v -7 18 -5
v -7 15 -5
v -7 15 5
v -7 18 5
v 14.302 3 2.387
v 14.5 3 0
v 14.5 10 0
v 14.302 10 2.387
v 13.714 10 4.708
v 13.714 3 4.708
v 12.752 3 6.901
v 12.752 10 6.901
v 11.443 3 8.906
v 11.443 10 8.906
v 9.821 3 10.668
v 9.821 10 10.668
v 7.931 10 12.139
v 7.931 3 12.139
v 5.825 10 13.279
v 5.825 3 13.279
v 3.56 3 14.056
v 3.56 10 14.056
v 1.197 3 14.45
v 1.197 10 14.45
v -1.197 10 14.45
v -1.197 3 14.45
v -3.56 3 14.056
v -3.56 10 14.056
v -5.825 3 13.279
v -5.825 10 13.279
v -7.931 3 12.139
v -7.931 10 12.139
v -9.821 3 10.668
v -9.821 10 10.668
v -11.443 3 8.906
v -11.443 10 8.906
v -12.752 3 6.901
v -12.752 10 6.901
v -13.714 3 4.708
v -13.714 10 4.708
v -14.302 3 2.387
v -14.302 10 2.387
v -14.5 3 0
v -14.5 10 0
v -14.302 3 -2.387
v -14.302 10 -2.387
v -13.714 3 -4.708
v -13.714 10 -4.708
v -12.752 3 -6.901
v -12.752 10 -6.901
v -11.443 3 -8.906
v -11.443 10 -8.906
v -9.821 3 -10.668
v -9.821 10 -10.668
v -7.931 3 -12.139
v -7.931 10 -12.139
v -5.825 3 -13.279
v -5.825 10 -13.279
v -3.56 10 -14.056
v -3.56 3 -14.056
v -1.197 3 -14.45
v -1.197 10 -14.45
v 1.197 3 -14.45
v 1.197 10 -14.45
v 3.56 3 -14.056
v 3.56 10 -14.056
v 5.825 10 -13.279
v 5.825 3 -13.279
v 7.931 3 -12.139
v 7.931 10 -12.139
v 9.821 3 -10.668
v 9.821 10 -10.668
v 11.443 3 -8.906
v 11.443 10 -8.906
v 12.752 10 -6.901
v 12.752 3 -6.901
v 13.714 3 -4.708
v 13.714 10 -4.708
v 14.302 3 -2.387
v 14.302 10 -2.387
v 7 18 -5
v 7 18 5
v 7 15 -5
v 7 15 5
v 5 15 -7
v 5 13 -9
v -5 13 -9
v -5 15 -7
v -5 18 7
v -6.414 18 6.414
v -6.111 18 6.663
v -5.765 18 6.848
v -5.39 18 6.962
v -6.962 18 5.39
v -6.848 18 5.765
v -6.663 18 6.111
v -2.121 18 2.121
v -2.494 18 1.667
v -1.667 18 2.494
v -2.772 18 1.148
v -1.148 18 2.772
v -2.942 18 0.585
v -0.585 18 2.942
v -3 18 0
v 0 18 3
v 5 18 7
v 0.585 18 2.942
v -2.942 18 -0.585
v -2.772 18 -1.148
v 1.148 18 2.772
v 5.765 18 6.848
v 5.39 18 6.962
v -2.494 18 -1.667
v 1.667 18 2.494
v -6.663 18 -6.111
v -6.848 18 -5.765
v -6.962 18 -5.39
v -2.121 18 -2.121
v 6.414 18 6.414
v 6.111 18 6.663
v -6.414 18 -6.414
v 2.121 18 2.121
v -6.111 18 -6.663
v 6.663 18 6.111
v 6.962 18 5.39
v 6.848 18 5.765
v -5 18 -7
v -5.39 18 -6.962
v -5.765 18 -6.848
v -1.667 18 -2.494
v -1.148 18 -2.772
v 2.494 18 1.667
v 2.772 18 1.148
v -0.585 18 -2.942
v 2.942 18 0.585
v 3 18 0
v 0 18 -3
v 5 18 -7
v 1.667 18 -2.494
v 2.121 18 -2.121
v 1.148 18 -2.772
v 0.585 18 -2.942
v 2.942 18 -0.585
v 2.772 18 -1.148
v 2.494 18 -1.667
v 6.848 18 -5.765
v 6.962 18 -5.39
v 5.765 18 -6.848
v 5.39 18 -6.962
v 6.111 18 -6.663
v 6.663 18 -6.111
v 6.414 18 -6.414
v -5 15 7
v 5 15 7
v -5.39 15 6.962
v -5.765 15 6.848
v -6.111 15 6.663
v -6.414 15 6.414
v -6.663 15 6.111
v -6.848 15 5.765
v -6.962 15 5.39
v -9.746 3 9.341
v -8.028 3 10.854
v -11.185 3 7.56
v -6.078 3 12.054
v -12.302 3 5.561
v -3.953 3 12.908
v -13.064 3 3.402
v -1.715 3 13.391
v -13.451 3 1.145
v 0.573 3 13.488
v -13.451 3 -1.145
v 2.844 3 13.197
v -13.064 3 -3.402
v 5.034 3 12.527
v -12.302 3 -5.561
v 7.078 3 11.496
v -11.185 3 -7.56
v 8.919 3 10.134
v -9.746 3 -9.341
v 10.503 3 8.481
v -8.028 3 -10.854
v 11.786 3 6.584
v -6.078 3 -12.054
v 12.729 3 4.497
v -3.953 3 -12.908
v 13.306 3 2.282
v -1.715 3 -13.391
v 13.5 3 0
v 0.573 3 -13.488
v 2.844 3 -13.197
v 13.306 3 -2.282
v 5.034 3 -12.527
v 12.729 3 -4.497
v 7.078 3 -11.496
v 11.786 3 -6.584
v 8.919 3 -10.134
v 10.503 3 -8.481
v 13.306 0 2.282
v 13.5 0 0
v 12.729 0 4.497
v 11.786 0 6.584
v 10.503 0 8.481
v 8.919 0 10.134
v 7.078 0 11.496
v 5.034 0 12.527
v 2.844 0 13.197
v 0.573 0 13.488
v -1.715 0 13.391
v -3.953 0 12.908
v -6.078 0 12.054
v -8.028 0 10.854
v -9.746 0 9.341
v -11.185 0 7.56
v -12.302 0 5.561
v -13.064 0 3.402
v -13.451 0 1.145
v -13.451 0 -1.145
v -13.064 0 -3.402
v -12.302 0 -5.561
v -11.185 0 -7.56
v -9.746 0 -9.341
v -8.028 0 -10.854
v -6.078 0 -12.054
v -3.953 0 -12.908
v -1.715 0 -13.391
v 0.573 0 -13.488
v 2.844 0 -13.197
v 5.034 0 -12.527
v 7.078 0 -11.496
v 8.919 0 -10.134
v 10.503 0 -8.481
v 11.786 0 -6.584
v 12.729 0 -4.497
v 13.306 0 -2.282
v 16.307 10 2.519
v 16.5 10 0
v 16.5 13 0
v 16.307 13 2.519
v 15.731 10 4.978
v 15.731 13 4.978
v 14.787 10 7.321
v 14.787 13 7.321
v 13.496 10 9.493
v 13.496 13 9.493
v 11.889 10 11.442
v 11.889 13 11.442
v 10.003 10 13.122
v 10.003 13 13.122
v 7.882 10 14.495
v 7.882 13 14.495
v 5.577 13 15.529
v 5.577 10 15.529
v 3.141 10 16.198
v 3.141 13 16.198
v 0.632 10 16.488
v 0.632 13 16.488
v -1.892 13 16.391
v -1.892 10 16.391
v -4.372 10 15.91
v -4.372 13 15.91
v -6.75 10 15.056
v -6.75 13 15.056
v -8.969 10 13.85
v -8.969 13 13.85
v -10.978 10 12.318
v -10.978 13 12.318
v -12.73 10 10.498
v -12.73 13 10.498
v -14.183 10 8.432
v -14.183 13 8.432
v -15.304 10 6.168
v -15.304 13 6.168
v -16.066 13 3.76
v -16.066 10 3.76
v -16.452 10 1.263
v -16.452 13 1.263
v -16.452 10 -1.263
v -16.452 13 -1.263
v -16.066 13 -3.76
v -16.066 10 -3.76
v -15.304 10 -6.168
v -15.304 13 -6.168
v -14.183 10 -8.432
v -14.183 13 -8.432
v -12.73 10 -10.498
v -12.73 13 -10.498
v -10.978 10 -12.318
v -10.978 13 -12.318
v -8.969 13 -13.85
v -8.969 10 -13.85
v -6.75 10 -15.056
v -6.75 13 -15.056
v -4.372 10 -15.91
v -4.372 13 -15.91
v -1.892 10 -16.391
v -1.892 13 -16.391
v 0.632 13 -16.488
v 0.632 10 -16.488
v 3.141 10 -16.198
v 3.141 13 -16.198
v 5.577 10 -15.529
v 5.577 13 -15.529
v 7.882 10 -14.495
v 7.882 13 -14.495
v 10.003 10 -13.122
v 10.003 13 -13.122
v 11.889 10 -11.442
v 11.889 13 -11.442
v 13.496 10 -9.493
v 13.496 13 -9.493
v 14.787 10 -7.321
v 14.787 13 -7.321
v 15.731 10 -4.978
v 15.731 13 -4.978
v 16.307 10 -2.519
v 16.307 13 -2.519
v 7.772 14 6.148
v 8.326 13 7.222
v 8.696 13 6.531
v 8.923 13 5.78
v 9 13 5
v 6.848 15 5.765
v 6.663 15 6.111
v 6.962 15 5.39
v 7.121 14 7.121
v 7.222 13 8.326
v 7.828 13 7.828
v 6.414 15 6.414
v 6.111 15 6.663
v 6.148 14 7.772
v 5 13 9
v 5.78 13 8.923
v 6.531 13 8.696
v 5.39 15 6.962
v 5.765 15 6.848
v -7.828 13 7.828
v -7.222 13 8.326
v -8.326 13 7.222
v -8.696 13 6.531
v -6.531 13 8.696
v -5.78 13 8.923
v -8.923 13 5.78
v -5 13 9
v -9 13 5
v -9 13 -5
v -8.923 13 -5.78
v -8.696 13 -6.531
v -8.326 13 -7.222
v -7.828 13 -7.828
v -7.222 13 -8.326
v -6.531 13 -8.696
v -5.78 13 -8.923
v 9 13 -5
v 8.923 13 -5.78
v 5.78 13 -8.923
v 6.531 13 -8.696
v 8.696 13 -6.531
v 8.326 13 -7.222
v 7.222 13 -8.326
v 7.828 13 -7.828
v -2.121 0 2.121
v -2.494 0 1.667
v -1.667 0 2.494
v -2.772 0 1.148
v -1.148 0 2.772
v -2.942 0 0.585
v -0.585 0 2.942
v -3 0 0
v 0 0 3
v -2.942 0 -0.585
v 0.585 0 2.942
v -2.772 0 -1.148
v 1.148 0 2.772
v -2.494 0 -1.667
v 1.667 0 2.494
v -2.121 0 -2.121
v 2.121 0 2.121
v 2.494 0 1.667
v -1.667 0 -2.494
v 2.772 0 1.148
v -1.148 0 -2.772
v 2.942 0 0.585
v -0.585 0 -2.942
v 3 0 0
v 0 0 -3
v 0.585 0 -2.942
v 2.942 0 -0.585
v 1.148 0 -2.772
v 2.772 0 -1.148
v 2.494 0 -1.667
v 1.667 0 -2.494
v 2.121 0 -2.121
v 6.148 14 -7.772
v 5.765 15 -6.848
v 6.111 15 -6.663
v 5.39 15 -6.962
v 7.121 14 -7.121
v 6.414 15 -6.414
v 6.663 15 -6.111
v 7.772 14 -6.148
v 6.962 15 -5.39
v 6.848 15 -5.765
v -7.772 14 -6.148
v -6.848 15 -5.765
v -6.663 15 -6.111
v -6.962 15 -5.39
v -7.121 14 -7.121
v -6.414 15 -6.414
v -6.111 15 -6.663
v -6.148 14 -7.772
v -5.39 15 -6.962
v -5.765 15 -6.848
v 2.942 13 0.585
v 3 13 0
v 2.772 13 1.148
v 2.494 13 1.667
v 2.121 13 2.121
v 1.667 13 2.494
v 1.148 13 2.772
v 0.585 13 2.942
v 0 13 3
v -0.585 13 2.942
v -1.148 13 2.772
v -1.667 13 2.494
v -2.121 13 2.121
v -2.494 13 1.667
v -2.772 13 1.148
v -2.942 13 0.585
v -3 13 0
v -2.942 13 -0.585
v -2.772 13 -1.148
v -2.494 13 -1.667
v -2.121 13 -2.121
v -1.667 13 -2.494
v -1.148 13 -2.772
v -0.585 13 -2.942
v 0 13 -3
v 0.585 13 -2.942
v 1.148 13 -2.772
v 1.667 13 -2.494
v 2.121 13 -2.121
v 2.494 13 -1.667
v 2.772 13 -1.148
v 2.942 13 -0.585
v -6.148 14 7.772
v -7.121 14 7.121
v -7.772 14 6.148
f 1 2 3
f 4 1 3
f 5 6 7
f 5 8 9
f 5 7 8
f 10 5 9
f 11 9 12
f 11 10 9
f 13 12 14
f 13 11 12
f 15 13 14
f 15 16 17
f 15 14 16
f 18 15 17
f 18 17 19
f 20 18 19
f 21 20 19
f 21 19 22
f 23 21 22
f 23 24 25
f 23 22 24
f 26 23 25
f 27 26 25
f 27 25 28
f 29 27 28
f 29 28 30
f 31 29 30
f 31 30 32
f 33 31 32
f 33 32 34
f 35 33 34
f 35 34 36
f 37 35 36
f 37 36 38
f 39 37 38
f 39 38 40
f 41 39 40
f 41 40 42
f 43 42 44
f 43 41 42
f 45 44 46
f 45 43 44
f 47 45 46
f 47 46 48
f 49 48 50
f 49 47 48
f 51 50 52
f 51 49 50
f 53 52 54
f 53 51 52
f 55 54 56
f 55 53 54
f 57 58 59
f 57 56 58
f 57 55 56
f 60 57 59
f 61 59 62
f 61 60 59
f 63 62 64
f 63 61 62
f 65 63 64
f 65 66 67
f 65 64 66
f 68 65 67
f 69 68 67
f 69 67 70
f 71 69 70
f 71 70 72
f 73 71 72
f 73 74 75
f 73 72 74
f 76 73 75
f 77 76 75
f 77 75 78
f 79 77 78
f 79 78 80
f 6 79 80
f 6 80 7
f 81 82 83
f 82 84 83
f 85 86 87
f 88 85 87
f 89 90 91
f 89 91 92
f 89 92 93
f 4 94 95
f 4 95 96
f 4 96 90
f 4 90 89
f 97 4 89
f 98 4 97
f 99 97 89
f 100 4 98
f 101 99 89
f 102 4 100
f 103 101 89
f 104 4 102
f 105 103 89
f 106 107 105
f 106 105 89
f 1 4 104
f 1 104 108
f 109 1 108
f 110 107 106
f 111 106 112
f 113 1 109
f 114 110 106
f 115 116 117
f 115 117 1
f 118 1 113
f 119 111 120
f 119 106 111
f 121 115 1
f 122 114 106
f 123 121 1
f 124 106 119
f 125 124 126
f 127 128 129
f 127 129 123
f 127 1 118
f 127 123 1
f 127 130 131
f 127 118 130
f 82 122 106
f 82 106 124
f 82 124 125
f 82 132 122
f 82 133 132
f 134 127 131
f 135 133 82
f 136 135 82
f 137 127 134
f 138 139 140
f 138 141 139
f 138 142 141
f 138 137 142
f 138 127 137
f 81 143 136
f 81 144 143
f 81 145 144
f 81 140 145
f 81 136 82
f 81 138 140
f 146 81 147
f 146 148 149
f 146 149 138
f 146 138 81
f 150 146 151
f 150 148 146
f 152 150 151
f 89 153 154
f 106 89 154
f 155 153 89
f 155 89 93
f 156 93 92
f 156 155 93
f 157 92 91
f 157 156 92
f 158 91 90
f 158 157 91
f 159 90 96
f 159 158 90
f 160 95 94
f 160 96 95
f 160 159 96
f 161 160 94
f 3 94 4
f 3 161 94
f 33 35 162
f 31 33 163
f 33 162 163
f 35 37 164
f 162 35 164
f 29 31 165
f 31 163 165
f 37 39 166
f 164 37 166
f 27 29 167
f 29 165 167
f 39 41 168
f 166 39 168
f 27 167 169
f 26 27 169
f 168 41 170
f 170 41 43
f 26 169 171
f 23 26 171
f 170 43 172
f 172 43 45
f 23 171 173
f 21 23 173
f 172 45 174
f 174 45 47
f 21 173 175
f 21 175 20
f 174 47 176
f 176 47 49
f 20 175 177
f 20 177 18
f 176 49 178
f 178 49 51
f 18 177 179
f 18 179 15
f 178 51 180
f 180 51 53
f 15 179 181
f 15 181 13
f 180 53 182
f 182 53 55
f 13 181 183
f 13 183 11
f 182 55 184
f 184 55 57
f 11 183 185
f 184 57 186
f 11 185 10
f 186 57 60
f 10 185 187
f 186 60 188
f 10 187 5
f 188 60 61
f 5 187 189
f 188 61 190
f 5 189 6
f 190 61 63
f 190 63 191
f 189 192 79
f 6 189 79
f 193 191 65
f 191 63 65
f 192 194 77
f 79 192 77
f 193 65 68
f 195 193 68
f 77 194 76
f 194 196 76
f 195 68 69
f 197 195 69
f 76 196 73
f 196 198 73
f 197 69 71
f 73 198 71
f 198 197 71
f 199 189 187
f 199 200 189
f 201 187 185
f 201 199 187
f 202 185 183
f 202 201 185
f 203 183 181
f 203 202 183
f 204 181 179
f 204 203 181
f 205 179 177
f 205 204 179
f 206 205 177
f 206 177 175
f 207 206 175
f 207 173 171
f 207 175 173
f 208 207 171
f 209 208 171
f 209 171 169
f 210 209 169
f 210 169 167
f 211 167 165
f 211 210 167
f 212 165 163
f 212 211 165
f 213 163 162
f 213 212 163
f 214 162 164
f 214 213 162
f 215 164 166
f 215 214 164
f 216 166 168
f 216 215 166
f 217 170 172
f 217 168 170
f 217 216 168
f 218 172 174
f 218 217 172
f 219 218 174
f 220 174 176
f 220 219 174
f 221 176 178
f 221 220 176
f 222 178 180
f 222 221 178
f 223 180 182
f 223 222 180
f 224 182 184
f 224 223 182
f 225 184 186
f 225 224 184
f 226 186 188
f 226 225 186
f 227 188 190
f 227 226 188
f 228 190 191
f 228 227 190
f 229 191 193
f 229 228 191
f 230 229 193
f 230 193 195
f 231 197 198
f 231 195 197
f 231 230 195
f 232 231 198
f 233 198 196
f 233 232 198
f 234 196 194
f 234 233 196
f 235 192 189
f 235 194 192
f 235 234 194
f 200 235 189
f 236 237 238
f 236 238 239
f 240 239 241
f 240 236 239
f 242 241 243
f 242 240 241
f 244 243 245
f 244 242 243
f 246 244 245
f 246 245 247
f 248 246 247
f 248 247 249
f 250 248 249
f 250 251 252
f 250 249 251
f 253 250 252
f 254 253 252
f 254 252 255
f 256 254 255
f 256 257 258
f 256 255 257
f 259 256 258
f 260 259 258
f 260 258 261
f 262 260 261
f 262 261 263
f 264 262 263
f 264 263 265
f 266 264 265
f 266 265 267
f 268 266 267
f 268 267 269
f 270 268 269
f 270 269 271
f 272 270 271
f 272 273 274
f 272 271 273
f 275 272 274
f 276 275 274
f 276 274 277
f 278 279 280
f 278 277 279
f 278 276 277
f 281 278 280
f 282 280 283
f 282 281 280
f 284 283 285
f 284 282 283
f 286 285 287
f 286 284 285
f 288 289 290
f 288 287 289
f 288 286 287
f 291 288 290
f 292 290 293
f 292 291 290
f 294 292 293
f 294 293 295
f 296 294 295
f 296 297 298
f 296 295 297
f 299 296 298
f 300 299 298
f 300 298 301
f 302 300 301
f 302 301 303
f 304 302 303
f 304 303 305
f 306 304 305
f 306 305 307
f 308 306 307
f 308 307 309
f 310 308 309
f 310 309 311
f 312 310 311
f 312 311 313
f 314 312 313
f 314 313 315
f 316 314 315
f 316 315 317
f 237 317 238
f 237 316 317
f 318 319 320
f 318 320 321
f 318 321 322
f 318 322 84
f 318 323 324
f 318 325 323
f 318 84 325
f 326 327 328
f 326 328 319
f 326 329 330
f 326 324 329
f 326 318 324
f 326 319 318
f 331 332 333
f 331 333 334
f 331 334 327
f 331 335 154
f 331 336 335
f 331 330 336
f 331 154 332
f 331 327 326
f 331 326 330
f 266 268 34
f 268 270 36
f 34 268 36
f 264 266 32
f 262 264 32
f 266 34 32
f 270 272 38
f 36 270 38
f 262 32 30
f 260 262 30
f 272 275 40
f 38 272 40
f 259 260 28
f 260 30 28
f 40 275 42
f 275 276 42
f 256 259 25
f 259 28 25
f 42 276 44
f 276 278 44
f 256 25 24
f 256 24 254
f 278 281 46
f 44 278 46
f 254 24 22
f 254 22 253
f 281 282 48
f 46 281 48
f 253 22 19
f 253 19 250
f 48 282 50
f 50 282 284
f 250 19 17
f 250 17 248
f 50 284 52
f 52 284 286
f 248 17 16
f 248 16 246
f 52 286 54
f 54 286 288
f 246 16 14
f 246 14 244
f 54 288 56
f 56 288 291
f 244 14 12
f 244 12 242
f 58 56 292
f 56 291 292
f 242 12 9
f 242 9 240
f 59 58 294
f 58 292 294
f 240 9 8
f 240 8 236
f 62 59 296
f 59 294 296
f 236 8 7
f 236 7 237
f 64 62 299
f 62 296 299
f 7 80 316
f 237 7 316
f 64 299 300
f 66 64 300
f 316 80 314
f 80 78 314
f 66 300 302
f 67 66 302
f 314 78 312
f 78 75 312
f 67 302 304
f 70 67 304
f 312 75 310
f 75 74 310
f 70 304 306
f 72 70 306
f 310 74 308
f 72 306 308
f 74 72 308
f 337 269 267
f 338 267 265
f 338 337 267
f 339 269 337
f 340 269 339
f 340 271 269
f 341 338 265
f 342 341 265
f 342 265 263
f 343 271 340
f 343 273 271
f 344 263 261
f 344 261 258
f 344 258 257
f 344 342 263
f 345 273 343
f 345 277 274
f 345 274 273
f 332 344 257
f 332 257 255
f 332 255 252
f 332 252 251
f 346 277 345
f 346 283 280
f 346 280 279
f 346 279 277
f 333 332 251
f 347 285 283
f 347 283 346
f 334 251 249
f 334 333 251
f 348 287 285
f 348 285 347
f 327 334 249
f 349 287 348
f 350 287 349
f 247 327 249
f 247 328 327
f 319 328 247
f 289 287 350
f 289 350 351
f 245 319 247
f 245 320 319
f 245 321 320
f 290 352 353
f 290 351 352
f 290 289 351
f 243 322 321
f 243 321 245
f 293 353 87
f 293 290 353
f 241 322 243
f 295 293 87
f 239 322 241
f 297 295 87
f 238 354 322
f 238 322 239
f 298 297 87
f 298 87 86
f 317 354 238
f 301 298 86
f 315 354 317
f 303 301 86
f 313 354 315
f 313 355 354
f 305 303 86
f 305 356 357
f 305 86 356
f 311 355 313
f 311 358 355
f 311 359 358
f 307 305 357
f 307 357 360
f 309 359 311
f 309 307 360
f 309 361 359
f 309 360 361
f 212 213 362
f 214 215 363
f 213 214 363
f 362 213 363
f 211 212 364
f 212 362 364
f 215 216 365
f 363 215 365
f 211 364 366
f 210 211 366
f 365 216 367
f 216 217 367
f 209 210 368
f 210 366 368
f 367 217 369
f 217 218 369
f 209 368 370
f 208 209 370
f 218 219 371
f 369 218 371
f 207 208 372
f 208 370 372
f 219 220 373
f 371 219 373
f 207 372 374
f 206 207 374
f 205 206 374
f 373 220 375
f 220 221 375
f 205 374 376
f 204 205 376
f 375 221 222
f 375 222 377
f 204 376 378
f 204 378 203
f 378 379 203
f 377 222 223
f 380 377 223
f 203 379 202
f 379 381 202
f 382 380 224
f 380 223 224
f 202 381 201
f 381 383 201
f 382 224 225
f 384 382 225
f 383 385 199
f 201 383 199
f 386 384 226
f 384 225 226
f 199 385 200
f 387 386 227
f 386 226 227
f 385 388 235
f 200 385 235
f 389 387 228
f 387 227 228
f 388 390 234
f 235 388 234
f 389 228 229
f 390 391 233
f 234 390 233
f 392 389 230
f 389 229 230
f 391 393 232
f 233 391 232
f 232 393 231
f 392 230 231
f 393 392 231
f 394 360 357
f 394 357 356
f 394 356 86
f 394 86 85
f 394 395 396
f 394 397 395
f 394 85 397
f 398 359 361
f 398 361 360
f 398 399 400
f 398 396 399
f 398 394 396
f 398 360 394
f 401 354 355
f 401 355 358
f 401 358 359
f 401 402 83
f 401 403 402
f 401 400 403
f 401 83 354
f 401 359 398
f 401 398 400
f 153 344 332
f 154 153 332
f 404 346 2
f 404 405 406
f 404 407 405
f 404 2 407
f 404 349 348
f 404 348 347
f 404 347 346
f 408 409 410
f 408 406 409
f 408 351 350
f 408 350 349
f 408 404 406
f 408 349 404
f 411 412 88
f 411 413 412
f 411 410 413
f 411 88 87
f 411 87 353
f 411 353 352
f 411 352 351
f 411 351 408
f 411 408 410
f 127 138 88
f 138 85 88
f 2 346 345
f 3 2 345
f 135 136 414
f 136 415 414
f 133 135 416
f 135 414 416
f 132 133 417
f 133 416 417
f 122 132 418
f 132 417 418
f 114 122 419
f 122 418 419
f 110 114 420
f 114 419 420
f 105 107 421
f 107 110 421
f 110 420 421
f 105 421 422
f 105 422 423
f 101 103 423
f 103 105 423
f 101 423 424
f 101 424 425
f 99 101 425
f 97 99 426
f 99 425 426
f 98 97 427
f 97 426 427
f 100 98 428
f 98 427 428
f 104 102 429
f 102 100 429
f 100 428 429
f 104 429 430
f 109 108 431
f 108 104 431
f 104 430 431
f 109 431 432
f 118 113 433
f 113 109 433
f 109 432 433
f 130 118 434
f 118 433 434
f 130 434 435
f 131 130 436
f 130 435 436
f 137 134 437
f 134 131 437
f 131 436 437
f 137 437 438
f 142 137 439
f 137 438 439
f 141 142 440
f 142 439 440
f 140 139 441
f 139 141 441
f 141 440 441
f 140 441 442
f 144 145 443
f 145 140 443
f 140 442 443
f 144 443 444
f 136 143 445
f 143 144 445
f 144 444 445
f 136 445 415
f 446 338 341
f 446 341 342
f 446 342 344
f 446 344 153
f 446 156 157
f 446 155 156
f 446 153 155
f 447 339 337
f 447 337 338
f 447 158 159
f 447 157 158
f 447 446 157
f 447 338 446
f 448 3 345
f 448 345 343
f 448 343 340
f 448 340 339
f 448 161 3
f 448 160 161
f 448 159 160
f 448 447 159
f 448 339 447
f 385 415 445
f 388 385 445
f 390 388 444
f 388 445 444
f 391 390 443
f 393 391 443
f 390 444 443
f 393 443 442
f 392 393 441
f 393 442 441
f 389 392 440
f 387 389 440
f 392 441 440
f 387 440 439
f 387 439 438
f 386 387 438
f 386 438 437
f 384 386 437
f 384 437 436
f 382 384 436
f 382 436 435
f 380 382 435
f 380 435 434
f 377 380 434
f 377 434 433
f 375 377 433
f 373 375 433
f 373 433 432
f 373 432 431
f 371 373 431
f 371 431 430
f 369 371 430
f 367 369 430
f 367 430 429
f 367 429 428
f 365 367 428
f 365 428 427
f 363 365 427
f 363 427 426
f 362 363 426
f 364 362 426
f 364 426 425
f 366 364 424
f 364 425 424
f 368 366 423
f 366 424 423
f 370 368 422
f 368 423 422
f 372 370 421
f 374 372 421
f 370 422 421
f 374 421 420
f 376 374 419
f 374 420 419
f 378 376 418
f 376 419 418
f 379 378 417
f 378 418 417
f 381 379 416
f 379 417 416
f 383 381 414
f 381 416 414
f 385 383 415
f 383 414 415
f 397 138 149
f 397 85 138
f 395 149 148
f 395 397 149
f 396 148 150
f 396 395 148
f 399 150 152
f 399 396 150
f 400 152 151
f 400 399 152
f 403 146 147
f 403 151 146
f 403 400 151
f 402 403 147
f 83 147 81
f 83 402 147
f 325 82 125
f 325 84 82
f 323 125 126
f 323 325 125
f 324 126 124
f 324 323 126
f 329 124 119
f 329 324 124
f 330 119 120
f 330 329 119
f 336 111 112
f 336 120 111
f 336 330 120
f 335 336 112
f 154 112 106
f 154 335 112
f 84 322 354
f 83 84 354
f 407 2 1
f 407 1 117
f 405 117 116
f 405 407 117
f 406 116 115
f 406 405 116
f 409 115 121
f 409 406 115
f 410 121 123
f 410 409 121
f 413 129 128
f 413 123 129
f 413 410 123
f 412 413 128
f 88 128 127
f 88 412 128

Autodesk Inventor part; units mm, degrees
ref_plane "YZ Plane" through (0, 0, 0) normal (1, 0, 0) x (0, 1, 0)
ref_plane "XZ Plane" through (0, 0, 0) normal (0, 1, 0) x (-1, 0, 0)
ref_plane "XY Plane" through (0, 0, 0) normal (0, 0, 1) x (1, 0, 0)
sketch "Эскиз1" plane through (0, 0, 0) normal (0, 0, 1) x (1, 0, 0)
  line L0 (0, 0) -> (0, 13)
  line L1 (0, 13) -> (16.5, 13)
  line L2 (16.5, 13) -> (16.5, 10)
  line L3 (16.5, 10) -> (14.5, 10)
  line L4 (14.5, 10) -> (14.5, 3)
  line L5 (14.5, 3) -> (13.5, 3)
  line L6 (13.5, 3) -> (13.5, 0)
  line L7 (13.5, 0) -> (0, 0)
  dimension "d0" = 13
  dimension "d1" = 16.5
  dimension "d2" = 3
  dimension "d3" = 2
  dimension "d4" = 7
  dimension "d5" = 1
revolve "Вращение1" add sketch "Эскиз1" angle 360 about axis through (0, 0, 0) along (0, 1, 0)
sketch "Эскиз2" plane through (0, 13, 0) normal (0, 1, 0) x (1, 0, 0)
  circle A0 centre (0, 0) radius 3
  line L0 (-5, -7) -> (5, -7)
  line L1 (7, -5) -> (7, 5)
  line L2 (5, 7) -> (-5, 7)
  line L3 (-7, 5) -> (-7, -5)
  line L4 (-7, -7) -> (7, 7) construction
  line L5 (7, -7) -> (-7, 7) construction
  arc A1 (-7, -5) -> (-5, -7) centre (-5, -5) ccw
  arc A2 (5, -7) -> (7, -5) centre (5, -5) ccw
  arc A3 (7, 5) -> (5, 7) centre (5, 5) ccw
  arc A4 (-5, 7) -> (-7, 5) centre (-5, 5) ccw
  dimension "d7" = 6
  dimension "d8" = 14
  dimension "d9" = 14
  dimension "d10" = 2
extrude "Выдавливание1" cut sketch "Эскиз2" against normal blind 24 contours A0
extrude "Выдавливание2" add sketch "Эскиз2" along normal blind 5
chamfer "Фаска1" distance 2 angle 45 8 edges at (0, 13, 7) (-6.4142, 13, 6.4142) (-7, 13, 0) (-6.4142, 13, -6.4142) (0, 13, -7) (6.4142, 13, -6.4142) (7, 13, 0) (6.4142, 13, 6.4142)
thread "Резьба1" size "M6x1" class "6H" standard "ANSI Metric M Profile" full length
properties part number "Top_contact" material "Сталь нержавеющая AISI 202"
